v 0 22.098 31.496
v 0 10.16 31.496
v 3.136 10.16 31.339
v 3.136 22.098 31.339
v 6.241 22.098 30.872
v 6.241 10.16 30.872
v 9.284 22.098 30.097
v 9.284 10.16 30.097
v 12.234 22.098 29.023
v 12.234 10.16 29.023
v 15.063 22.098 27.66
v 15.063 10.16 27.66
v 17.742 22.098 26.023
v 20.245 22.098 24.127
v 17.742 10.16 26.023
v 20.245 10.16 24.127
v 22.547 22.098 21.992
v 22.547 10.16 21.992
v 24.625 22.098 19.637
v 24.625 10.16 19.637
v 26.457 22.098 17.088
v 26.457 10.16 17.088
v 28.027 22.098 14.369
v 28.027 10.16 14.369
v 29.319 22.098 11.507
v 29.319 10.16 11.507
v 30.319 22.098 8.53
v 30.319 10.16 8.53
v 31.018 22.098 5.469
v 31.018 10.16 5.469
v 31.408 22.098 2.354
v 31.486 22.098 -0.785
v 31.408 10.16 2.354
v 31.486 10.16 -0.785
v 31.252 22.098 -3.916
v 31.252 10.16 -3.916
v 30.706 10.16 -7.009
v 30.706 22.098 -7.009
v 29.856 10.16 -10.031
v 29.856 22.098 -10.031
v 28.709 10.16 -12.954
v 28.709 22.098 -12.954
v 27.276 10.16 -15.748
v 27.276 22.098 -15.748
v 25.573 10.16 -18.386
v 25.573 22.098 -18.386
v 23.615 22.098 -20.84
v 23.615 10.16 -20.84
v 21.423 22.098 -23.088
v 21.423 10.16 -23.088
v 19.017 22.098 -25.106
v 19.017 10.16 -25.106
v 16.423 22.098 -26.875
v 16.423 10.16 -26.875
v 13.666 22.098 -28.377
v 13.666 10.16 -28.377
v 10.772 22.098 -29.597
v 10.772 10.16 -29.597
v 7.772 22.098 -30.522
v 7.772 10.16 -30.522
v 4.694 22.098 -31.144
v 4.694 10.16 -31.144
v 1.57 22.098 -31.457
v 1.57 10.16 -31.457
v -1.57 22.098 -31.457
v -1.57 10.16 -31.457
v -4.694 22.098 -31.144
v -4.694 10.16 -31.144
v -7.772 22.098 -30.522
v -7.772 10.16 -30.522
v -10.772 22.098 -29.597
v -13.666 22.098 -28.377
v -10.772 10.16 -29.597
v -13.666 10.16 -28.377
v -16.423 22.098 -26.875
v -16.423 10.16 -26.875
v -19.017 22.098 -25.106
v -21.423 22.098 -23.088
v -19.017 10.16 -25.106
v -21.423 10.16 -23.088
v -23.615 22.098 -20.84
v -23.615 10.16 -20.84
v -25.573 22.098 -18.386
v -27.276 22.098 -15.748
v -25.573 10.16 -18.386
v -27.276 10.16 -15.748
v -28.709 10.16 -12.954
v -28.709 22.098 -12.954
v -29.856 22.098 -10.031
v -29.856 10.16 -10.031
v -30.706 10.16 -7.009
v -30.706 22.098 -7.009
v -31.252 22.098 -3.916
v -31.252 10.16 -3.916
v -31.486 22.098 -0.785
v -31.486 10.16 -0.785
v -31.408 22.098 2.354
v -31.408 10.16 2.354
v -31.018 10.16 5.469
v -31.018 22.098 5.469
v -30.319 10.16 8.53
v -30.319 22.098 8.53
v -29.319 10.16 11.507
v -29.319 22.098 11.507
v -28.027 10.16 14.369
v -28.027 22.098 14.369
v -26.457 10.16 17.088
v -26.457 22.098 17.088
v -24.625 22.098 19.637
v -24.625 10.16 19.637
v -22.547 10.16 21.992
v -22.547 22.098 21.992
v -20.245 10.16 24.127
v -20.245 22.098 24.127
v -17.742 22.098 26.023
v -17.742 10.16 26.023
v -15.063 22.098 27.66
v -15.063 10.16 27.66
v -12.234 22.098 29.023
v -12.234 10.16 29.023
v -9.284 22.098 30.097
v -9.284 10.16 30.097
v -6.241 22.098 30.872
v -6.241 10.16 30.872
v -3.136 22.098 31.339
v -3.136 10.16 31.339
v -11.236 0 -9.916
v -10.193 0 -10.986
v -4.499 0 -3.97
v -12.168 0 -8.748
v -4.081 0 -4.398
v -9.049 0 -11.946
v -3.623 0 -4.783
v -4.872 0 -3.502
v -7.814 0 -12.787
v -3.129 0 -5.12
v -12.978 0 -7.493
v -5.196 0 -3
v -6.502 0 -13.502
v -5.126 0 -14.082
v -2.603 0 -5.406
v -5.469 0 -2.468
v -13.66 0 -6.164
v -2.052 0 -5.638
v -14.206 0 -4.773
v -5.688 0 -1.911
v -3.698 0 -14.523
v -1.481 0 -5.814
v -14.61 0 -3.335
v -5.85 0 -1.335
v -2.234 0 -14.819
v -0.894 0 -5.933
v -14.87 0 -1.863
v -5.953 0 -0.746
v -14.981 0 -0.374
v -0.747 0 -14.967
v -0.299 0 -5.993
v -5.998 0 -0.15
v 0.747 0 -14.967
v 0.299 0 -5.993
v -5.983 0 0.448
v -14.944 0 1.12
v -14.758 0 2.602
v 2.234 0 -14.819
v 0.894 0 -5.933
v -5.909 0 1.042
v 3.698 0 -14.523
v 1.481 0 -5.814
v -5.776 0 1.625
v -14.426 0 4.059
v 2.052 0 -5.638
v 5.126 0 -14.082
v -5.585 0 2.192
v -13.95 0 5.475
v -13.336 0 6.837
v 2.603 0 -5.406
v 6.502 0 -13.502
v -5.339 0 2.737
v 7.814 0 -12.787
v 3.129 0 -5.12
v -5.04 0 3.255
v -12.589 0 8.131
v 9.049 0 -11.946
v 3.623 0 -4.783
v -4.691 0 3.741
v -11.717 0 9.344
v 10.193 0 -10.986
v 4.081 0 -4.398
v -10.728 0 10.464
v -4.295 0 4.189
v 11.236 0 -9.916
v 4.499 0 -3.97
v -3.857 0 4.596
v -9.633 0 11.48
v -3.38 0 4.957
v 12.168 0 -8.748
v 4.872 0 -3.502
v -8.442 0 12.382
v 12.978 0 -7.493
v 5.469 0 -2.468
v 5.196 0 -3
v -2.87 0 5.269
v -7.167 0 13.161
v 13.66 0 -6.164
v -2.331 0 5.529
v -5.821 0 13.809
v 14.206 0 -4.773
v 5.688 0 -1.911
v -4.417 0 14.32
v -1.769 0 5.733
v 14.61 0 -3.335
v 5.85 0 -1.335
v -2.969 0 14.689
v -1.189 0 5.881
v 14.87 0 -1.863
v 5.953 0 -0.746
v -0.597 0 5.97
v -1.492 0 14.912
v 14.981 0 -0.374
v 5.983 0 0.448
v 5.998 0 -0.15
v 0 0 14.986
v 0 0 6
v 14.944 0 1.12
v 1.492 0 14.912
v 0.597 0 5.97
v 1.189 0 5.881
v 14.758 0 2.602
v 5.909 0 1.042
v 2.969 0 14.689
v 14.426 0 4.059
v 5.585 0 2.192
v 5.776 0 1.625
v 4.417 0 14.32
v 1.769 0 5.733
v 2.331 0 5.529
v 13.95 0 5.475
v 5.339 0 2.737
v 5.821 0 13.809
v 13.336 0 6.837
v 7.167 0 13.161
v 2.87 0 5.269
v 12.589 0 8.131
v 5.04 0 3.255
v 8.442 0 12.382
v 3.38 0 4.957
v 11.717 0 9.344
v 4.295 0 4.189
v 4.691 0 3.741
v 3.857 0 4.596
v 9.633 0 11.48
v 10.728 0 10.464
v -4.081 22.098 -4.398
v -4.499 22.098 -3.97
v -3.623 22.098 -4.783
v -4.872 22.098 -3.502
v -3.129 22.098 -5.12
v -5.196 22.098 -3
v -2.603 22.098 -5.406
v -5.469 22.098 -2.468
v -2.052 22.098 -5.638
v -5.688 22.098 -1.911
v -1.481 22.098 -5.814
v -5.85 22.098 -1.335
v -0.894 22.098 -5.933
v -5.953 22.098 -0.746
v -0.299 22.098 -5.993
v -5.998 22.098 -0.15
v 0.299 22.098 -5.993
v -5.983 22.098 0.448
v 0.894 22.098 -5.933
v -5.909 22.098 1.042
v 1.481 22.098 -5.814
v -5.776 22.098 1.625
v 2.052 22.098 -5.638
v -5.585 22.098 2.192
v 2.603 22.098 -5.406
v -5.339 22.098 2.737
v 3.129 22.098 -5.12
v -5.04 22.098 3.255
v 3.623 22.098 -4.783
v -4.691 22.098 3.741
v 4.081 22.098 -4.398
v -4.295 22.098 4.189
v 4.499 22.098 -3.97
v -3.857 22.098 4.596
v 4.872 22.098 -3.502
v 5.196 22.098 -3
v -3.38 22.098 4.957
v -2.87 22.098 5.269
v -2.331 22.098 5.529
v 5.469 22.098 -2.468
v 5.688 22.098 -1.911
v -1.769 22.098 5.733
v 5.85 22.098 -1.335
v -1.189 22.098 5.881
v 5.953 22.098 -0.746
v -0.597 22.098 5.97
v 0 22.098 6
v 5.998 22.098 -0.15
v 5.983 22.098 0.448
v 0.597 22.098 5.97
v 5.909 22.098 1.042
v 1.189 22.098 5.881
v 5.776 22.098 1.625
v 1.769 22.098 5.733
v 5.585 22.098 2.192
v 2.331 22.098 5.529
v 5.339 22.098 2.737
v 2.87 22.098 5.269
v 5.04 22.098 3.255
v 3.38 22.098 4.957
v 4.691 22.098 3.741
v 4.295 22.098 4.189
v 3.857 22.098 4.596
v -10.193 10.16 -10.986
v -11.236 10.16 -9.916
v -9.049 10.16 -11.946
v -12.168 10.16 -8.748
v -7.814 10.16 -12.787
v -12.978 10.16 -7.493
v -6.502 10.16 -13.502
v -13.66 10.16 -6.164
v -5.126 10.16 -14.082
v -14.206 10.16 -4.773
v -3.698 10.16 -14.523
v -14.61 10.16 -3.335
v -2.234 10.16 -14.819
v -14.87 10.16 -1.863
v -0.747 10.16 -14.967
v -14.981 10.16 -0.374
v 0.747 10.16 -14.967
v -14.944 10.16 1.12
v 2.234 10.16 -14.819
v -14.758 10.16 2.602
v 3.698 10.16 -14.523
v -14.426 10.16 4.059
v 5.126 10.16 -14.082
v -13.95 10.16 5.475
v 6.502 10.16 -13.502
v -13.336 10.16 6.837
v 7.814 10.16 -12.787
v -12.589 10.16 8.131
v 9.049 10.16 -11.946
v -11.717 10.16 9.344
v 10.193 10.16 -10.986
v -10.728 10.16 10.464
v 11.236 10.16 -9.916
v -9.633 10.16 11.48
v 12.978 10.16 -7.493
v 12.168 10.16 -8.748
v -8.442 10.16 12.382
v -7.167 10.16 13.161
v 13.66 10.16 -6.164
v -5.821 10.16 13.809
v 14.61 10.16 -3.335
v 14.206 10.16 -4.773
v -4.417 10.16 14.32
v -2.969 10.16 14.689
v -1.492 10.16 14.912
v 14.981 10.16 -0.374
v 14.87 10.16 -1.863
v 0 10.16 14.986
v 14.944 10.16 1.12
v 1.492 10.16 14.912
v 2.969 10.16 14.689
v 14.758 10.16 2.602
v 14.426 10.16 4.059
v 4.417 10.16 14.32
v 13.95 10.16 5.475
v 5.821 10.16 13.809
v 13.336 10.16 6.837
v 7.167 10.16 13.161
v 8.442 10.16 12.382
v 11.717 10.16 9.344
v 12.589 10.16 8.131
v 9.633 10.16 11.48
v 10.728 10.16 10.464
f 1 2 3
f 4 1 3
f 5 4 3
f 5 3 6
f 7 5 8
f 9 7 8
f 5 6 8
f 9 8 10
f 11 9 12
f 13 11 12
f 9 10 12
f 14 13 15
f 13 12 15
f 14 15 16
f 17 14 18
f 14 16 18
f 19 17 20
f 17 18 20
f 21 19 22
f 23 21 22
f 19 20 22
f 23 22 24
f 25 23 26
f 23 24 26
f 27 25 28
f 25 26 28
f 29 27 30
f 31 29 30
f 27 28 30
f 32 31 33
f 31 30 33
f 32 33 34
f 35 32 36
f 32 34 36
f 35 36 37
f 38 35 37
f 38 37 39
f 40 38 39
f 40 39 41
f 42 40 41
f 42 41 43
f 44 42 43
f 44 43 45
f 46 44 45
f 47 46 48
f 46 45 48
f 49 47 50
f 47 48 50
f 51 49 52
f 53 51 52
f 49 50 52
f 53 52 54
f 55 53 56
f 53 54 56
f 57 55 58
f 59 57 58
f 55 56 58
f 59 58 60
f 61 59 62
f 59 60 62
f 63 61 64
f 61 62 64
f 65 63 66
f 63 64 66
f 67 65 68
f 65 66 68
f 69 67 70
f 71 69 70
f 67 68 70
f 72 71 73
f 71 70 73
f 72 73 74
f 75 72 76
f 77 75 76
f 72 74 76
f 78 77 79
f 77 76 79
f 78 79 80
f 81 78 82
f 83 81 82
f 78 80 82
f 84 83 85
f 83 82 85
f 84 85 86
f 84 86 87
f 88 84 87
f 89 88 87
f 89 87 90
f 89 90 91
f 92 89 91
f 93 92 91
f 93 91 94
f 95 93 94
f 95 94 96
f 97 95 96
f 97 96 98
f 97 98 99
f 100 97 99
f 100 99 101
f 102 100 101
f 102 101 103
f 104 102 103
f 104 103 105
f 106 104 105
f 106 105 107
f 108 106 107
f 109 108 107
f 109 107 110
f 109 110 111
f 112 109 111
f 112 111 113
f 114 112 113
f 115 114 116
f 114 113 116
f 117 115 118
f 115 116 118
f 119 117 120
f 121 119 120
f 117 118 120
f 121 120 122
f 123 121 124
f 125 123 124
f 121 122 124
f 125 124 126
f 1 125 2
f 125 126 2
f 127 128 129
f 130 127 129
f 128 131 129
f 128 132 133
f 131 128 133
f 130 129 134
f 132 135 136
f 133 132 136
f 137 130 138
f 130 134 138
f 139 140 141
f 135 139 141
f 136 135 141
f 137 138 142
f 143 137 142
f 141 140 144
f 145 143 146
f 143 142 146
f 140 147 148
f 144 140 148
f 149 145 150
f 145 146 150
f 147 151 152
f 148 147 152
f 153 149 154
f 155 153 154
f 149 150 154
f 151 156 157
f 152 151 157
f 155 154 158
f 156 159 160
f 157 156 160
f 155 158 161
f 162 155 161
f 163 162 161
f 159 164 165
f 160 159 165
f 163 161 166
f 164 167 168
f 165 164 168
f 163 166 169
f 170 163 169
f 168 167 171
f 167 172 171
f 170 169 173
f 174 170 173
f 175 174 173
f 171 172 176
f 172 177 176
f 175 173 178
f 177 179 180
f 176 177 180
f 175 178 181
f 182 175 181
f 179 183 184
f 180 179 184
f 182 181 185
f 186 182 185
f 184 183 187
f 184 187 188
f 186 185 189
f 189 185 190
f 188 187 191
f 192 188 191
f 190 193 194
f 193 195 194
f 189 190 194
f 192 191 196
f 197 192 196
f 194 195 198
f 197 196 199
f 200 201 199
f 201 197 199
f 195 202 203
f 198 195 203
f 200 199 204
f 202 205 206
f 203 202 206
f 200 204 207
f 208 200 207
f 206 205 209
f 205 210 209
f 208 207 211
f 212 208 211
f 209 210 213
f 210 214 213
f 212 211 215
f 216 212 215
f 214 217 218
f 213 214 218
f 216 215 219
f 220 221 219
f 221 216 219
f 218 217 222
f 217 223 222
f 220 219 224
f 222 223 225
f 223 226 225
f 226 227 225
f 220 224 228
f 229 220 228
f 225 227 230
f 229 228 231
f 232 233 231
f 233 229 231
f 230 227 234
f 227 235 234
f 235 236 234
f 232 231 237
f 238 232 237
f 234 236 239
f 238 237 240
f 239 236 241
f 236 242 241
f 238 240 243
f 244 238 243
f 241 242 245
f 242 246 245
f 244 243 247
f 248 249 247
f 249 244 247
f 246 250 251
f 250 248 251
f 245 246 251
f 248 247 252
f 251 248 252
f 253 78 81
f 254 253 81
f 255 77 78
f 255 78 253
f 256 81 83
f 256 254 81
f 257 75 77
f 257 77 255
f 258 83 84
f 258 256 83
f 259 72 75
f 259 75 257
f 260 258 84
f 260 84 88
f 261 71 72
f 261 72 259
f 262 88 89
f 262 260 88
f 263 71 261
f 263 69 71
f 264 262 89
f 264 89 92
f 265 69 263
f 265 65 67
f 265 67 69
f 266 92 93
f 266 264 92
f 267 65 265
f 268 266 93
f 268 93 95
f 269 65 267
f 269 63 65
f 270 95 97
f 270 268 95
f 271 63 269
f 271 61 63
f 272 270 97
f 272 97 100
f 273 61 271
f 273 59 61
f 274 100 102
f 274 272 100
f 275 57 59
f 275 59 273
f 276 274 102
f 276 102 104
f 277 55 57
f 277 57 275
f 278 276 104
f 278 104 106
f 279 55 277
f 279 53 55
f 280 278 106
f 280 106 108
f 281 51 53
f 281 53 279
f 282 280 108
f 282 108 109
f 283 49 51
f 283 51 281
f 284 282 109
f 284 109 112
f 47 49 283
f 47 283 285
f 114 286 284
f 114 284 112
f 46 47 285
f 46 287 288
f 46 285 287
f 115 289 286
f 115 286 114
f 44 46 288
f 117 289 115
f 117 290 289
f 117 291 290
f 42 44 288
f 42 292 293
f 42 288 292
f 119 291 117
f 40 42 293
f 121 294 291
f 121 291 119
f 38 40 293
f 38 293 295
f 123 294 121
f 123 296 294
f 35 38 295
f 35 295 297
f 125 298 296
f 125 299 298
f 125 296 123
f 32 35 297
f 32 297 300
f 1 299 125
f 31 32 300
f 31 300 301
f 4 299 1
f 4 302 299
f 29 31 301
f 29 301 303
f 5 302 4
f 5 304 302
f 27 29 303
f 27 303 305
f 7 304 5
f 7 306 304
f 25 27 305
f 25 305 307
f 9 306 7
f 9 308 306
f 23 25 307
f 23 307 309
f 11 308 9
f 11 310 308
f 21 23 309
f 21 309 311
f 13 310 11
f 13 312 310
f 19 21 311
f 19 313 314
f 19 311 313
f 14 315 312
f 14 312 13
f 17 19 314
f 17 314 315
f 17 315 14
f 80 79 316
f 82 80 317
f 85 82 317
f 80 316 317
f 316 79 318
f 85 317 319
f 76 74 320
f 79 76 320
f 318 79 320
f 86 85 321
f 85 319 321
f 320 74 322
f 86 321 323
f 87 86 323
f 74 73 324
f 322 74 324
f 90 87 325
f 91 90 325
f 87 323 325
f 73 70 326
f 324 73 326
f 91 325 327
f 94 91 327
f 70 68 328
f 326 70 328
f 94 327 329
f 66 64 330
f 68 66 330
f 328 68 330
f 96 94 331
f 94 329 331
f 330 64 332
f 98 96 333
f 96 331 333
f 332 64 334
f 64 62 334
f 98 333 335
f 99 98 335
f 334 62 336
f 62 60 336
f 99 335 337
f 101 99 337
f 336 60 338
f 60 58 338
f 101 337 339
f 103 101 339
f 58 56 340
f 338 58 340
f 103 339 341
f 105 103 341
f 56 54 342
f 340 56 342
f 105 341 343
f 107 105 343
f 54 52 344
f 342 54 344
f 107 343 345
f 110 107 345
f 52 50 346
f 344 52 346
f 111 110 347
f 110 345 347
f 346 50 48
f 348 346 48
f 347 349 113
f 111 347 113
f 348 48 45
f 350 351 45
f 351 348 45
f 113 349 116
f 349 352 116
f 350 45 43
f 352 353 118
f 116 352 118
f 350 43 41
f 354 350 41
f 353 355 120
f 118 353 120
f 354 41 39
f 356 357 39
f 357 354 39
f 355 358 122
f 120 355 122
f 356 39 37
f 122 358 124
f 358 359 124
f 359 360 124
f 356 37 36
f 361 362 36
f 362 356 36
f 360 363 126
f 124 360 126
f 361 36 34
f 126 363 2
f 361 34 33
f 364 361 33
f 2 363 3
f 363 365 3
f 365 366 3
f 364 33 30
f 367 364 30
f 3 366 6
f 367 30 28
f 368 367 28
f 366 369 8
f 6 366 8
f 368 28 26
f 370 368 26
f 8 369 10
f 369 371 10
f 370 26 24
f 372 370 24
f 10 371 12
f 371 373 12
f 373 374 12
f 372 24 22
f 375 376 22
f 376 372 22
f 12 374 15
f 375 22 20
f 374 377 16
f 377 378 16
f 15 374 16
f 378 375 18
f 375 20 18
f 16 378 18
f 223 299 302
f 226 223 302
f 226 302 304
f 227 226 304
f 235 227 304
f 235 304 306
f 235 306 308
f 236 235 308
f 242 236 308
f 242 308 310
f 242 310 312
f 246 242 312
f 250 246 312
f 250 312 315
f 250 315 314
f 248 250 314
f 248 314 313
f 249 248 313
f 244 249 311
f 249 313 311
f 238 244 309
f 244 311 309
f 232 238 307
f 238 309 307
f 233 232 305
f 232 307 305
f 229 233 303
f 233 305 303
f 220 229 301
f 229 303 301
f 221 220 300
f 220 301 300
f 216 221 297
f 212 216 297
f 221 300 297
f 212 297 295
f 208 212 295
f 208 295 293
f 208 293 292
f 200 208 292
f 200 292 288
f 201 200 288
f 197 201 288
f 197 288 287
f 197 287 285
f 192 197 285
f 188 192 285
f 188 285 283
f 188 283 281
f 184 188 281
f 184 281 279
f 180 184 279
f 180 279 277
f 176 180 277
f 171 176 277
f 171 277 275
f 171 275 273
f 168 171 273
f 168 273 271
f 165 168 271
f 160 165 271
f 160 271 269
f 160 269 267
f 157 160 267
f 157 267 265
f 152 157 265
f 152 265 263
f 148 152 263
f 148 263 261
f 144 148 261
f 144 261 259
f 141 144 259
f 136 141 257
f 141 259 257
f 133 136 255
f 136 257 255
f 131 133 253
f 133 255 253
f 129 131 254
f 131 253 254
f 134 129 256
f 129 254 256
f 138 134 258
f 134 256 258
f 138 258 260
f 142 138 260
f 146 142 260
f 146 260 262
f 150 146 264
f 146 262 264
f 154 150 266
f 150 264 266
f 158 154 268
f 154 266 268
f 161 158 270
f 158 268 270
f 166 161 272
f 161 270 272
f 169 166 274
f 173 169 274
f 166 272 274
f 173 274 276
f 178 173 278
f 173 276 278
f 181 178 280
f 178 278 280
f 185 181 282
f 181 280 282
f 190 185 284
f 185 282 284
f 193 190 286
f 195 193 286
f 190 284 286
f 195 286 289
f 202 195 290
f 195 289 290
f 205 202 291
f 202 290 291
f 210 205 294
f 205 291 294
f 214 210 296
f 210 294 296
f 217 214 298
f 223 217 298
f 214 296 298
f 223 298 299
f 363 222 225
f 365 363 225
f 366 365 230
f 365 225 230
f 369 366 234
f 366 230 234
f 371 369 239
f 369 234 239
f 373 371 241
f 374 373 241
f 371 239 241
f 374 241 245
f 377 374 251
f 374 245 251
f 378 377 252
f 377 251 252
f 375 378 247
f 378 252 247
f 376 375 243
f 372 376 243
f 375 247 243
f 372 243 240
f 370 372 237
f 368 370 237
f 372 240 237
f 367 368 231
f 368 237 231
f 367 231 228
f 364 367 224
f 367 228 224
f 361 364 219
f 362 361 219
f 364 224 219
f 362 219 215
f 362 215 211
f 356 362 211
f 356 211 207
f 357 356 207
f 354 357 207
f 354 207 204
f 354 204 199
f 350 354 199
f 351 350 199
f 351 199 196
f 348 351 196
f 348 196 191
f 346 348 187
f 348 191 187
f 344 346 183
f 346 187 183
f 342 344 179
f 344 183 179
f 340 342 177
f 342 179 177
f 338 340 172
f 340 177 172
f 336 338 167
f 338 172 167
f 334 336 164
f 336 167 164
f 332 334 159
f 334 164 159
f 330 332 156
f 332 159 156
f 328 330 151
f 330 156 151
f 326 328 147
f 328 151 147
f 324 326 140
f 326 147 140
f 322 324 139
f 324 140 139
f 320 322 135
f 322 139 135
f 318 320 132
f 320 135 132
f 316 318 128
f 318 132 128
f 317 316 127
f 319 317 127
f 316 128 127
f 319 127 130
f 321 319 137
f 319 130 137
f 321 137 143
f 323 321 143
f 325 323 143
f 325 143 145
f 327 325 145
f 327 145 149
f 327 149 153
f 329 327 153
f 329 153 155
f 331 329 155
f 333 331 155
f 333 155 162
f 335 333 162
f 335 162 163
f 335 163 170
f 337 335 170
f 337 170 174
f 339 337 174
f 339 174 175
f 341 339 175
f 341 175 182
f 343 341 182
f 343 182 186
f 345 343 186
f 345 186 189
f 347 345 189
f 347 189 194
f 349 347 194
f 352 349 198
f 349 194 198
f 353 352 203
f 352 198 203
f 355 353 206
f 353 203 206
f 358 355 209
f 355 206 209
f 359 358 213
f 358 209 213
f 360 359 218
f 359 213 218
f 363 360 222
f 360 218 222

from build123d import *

# Parameters (mm, degrees)
SKETCH1_R          = 14.986
BASE_DEPTH         = 10.16
SKETCH2_R          = 31.496
GEAR_DEPTH         = 11.938
SKETCH3_R          = 6
CUT_EXTRUDE1_DEPTH = 50.722405774


with BuildPart() as part:
    # Sketch1 → Base (new body)
    with BuildSketch(Plane(origin=(0, 0, 0), x_dir=(1, 0, 0), z_dir=(0, 1, 0))):
        with Locations(Location((0, 0, 0), (0, 0, 270))):
            Circle(SKETCH1_R)
    extrude(amount=BASE_DEPTH)

    # Sketch2 → Gear (add)
    with BuildSketch(Plane(origin=(0, 10.16, 0), x_dir=(1, 0, 0), z_dir=(0, 1, 0))):
        with Locations(Location((0, 0, 0), (0, 0, 270))):
            Circle(SKETCH2_R)
    extrude(amount=GEAR_DEPTH)

    # Sketch3 → Cut-Extrude1 (cut, through all)
    with BuildSketch(Plane(origin=(0, 22.098, 0), x_dir=(1, 0, 0), z_dir=(0, 1, 0))):
        with Locations(Location((0, 0, 0), (0, 0, 270))):
            Circle(SKETCH3_R)
    extrude(amount=-CUT_EXTRUDE1_DEPTH, mode=Mode.SUBTRACT)


solid = part.part
